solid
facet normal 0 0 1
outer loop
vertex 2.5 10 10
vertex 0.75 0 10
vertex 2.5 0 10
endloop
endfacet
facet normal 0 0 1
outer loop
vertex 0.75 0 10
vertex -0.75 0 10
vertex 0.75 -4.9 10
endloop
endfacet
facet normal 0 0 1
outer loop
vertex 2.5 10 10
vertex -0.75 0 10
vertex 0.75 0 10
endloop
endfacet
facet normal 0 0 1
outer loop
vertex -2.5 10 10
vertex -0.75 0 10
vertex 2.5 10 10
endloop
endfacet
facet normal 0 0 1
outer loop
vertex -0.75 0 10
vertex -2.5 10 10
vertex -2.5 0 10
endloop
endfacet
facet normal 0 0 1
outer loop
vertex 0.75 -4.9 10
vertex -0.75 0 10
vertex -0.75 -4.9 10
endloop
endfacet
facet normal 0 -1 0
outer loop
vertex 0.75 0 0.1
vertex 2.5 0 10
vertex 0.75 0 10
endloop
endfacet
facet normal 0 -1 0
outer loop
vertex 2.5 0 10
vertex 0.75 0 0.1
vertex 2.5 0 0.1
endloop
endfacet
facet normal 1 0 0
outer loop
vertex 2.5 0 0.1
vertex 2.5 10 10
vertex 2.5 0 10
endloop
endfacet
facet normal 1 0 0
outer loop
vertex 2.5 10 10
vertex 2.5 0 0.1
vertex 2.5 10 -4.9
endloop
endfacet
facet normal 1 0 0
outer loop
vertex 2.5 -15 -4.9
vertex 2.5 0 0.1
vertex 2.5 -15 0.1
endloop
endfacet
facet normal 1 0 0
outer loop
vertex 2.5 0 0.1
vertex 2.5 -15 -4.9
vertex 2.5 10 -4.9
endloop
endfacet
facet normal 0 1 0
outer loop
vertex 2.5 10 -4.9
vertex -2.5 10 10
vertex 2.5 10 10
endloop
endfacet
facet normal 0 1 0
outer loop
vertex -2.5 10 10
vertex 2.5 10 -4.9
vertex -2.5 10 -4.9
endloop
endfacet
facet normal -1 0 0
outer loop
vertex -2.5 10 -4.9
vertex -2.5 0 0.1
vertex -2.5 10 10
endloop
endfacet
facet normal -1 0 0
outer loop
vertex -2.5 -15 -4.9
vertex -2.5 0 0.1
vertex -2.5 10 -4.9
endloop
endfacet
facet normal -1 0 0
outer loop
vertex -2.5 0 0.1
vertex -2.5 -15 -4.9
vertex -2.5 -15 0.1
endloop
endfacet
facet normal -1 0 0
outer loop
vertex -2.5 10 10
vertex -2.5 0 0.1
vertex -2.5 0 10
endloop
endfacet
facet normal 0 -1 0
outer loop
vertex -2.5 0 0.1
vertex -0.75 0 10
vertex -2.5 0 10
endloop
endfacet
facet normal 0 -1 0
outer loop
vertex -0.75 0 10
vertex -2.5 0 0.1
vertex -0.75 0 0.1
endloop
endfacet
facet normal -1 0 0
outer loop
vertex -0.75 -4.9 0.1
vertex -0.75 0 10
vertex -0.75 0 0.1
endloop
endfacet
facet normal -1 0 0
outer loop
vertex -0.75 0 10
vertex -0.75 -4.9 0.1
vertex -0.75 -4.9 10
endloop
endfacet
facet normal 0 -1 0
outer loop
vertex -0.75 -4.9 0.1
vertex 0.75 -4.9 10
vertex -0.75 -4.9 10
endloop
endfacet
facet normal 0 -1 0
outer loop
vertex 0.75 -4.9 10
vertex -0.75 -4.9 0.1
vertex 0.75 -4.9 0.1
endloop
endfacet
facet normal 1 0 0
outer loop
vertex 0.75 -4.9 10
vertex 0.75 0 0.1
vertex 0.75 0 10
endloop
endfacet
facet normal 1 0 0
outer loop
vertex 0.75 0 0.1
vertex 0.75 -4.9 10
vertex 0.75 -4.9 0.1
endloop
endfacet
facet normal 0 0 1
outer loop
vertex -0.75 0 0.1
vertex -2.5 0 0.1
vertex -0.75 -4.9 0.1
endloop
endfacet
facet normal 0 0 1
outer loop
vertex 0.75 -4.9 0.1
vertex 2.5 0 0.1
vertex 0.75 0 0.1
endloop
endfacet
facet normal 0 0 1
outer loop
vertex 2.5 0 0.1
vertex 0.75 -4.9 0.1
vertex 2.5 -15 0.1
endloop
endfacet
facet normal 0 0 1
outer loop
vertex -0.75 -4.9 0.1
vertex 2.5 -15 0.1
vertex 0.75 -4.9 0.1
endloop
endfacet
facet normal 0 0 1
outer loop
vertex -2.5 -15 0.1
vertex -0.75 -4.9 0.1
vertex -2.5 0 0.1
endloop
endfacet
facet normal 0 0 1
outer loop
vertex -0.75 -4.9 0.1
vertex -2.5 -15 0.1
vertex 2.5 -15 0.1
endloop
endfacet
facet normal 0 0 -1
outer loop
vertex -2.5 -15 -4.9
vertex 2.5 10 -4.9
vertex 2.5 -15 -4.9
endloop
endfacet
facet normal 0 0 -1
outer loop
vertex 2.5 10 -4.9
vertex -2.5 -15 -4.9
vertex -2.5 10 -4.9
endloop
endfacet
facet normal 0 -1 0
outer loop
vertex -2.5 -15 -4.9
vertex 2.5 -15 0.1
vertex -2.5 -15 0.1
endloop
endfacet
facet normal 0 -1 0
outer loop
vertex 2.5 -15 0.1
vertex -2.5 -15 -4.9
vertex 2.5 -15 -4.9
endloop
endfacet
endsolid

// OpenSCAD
eps=0.1;
//duv_length =10;
//duv_width=10;
//duv_height=10;
//duv_bite = 3

//
//clp_length =20;//rail_enclosure_width + duv_length
//clp_width =duv_width;
//clp_height=10;

module duvTail(length= 10, width= 10, height=10, inbite = 4){

intersection(){

    linear_extrude(height=height){

        union(){
        translate([-width/2,0,0]) square([width, length]);
        translate([0,-inbite,0])polygon([[0,sqrt(3)*width/2],[width/2, 0],[-width/2, 0]]);
            }
        }
    color([1,0,0]) translate([-width/2,-inbite,0]) cube([width, length+inbite, height]);
    }



}



module flatTail(length= 5, width= 10, height=10, inbite = 5, biteWidth=3){


    linear_extrude(height=height){

        union(){
        translate([-width/2,0,0]) square([width, length]);
        translate([-biteWidth/2,-inbite+eps,0])square([biteWidth, inbite]);
            }
        }



}



module assemblyClip(side_length=10, side_width=5, side_height=10, clip_len = 20, clip_width=5, clip_height=5, inbite=5,biteWidth=1.5){
    
        union(){
            flatTail(length=side_length, width=side_width, height=side_height, inbite = inbite, biteWidth=biteWidth);
            translate([-clip_width/2,side_length-clip_len-inbite,eps-clip_height])cube([clip_width,clip_len+inbite, clip_height]);
        }

    


    
}


//flatTail();



assemblyClip( );
